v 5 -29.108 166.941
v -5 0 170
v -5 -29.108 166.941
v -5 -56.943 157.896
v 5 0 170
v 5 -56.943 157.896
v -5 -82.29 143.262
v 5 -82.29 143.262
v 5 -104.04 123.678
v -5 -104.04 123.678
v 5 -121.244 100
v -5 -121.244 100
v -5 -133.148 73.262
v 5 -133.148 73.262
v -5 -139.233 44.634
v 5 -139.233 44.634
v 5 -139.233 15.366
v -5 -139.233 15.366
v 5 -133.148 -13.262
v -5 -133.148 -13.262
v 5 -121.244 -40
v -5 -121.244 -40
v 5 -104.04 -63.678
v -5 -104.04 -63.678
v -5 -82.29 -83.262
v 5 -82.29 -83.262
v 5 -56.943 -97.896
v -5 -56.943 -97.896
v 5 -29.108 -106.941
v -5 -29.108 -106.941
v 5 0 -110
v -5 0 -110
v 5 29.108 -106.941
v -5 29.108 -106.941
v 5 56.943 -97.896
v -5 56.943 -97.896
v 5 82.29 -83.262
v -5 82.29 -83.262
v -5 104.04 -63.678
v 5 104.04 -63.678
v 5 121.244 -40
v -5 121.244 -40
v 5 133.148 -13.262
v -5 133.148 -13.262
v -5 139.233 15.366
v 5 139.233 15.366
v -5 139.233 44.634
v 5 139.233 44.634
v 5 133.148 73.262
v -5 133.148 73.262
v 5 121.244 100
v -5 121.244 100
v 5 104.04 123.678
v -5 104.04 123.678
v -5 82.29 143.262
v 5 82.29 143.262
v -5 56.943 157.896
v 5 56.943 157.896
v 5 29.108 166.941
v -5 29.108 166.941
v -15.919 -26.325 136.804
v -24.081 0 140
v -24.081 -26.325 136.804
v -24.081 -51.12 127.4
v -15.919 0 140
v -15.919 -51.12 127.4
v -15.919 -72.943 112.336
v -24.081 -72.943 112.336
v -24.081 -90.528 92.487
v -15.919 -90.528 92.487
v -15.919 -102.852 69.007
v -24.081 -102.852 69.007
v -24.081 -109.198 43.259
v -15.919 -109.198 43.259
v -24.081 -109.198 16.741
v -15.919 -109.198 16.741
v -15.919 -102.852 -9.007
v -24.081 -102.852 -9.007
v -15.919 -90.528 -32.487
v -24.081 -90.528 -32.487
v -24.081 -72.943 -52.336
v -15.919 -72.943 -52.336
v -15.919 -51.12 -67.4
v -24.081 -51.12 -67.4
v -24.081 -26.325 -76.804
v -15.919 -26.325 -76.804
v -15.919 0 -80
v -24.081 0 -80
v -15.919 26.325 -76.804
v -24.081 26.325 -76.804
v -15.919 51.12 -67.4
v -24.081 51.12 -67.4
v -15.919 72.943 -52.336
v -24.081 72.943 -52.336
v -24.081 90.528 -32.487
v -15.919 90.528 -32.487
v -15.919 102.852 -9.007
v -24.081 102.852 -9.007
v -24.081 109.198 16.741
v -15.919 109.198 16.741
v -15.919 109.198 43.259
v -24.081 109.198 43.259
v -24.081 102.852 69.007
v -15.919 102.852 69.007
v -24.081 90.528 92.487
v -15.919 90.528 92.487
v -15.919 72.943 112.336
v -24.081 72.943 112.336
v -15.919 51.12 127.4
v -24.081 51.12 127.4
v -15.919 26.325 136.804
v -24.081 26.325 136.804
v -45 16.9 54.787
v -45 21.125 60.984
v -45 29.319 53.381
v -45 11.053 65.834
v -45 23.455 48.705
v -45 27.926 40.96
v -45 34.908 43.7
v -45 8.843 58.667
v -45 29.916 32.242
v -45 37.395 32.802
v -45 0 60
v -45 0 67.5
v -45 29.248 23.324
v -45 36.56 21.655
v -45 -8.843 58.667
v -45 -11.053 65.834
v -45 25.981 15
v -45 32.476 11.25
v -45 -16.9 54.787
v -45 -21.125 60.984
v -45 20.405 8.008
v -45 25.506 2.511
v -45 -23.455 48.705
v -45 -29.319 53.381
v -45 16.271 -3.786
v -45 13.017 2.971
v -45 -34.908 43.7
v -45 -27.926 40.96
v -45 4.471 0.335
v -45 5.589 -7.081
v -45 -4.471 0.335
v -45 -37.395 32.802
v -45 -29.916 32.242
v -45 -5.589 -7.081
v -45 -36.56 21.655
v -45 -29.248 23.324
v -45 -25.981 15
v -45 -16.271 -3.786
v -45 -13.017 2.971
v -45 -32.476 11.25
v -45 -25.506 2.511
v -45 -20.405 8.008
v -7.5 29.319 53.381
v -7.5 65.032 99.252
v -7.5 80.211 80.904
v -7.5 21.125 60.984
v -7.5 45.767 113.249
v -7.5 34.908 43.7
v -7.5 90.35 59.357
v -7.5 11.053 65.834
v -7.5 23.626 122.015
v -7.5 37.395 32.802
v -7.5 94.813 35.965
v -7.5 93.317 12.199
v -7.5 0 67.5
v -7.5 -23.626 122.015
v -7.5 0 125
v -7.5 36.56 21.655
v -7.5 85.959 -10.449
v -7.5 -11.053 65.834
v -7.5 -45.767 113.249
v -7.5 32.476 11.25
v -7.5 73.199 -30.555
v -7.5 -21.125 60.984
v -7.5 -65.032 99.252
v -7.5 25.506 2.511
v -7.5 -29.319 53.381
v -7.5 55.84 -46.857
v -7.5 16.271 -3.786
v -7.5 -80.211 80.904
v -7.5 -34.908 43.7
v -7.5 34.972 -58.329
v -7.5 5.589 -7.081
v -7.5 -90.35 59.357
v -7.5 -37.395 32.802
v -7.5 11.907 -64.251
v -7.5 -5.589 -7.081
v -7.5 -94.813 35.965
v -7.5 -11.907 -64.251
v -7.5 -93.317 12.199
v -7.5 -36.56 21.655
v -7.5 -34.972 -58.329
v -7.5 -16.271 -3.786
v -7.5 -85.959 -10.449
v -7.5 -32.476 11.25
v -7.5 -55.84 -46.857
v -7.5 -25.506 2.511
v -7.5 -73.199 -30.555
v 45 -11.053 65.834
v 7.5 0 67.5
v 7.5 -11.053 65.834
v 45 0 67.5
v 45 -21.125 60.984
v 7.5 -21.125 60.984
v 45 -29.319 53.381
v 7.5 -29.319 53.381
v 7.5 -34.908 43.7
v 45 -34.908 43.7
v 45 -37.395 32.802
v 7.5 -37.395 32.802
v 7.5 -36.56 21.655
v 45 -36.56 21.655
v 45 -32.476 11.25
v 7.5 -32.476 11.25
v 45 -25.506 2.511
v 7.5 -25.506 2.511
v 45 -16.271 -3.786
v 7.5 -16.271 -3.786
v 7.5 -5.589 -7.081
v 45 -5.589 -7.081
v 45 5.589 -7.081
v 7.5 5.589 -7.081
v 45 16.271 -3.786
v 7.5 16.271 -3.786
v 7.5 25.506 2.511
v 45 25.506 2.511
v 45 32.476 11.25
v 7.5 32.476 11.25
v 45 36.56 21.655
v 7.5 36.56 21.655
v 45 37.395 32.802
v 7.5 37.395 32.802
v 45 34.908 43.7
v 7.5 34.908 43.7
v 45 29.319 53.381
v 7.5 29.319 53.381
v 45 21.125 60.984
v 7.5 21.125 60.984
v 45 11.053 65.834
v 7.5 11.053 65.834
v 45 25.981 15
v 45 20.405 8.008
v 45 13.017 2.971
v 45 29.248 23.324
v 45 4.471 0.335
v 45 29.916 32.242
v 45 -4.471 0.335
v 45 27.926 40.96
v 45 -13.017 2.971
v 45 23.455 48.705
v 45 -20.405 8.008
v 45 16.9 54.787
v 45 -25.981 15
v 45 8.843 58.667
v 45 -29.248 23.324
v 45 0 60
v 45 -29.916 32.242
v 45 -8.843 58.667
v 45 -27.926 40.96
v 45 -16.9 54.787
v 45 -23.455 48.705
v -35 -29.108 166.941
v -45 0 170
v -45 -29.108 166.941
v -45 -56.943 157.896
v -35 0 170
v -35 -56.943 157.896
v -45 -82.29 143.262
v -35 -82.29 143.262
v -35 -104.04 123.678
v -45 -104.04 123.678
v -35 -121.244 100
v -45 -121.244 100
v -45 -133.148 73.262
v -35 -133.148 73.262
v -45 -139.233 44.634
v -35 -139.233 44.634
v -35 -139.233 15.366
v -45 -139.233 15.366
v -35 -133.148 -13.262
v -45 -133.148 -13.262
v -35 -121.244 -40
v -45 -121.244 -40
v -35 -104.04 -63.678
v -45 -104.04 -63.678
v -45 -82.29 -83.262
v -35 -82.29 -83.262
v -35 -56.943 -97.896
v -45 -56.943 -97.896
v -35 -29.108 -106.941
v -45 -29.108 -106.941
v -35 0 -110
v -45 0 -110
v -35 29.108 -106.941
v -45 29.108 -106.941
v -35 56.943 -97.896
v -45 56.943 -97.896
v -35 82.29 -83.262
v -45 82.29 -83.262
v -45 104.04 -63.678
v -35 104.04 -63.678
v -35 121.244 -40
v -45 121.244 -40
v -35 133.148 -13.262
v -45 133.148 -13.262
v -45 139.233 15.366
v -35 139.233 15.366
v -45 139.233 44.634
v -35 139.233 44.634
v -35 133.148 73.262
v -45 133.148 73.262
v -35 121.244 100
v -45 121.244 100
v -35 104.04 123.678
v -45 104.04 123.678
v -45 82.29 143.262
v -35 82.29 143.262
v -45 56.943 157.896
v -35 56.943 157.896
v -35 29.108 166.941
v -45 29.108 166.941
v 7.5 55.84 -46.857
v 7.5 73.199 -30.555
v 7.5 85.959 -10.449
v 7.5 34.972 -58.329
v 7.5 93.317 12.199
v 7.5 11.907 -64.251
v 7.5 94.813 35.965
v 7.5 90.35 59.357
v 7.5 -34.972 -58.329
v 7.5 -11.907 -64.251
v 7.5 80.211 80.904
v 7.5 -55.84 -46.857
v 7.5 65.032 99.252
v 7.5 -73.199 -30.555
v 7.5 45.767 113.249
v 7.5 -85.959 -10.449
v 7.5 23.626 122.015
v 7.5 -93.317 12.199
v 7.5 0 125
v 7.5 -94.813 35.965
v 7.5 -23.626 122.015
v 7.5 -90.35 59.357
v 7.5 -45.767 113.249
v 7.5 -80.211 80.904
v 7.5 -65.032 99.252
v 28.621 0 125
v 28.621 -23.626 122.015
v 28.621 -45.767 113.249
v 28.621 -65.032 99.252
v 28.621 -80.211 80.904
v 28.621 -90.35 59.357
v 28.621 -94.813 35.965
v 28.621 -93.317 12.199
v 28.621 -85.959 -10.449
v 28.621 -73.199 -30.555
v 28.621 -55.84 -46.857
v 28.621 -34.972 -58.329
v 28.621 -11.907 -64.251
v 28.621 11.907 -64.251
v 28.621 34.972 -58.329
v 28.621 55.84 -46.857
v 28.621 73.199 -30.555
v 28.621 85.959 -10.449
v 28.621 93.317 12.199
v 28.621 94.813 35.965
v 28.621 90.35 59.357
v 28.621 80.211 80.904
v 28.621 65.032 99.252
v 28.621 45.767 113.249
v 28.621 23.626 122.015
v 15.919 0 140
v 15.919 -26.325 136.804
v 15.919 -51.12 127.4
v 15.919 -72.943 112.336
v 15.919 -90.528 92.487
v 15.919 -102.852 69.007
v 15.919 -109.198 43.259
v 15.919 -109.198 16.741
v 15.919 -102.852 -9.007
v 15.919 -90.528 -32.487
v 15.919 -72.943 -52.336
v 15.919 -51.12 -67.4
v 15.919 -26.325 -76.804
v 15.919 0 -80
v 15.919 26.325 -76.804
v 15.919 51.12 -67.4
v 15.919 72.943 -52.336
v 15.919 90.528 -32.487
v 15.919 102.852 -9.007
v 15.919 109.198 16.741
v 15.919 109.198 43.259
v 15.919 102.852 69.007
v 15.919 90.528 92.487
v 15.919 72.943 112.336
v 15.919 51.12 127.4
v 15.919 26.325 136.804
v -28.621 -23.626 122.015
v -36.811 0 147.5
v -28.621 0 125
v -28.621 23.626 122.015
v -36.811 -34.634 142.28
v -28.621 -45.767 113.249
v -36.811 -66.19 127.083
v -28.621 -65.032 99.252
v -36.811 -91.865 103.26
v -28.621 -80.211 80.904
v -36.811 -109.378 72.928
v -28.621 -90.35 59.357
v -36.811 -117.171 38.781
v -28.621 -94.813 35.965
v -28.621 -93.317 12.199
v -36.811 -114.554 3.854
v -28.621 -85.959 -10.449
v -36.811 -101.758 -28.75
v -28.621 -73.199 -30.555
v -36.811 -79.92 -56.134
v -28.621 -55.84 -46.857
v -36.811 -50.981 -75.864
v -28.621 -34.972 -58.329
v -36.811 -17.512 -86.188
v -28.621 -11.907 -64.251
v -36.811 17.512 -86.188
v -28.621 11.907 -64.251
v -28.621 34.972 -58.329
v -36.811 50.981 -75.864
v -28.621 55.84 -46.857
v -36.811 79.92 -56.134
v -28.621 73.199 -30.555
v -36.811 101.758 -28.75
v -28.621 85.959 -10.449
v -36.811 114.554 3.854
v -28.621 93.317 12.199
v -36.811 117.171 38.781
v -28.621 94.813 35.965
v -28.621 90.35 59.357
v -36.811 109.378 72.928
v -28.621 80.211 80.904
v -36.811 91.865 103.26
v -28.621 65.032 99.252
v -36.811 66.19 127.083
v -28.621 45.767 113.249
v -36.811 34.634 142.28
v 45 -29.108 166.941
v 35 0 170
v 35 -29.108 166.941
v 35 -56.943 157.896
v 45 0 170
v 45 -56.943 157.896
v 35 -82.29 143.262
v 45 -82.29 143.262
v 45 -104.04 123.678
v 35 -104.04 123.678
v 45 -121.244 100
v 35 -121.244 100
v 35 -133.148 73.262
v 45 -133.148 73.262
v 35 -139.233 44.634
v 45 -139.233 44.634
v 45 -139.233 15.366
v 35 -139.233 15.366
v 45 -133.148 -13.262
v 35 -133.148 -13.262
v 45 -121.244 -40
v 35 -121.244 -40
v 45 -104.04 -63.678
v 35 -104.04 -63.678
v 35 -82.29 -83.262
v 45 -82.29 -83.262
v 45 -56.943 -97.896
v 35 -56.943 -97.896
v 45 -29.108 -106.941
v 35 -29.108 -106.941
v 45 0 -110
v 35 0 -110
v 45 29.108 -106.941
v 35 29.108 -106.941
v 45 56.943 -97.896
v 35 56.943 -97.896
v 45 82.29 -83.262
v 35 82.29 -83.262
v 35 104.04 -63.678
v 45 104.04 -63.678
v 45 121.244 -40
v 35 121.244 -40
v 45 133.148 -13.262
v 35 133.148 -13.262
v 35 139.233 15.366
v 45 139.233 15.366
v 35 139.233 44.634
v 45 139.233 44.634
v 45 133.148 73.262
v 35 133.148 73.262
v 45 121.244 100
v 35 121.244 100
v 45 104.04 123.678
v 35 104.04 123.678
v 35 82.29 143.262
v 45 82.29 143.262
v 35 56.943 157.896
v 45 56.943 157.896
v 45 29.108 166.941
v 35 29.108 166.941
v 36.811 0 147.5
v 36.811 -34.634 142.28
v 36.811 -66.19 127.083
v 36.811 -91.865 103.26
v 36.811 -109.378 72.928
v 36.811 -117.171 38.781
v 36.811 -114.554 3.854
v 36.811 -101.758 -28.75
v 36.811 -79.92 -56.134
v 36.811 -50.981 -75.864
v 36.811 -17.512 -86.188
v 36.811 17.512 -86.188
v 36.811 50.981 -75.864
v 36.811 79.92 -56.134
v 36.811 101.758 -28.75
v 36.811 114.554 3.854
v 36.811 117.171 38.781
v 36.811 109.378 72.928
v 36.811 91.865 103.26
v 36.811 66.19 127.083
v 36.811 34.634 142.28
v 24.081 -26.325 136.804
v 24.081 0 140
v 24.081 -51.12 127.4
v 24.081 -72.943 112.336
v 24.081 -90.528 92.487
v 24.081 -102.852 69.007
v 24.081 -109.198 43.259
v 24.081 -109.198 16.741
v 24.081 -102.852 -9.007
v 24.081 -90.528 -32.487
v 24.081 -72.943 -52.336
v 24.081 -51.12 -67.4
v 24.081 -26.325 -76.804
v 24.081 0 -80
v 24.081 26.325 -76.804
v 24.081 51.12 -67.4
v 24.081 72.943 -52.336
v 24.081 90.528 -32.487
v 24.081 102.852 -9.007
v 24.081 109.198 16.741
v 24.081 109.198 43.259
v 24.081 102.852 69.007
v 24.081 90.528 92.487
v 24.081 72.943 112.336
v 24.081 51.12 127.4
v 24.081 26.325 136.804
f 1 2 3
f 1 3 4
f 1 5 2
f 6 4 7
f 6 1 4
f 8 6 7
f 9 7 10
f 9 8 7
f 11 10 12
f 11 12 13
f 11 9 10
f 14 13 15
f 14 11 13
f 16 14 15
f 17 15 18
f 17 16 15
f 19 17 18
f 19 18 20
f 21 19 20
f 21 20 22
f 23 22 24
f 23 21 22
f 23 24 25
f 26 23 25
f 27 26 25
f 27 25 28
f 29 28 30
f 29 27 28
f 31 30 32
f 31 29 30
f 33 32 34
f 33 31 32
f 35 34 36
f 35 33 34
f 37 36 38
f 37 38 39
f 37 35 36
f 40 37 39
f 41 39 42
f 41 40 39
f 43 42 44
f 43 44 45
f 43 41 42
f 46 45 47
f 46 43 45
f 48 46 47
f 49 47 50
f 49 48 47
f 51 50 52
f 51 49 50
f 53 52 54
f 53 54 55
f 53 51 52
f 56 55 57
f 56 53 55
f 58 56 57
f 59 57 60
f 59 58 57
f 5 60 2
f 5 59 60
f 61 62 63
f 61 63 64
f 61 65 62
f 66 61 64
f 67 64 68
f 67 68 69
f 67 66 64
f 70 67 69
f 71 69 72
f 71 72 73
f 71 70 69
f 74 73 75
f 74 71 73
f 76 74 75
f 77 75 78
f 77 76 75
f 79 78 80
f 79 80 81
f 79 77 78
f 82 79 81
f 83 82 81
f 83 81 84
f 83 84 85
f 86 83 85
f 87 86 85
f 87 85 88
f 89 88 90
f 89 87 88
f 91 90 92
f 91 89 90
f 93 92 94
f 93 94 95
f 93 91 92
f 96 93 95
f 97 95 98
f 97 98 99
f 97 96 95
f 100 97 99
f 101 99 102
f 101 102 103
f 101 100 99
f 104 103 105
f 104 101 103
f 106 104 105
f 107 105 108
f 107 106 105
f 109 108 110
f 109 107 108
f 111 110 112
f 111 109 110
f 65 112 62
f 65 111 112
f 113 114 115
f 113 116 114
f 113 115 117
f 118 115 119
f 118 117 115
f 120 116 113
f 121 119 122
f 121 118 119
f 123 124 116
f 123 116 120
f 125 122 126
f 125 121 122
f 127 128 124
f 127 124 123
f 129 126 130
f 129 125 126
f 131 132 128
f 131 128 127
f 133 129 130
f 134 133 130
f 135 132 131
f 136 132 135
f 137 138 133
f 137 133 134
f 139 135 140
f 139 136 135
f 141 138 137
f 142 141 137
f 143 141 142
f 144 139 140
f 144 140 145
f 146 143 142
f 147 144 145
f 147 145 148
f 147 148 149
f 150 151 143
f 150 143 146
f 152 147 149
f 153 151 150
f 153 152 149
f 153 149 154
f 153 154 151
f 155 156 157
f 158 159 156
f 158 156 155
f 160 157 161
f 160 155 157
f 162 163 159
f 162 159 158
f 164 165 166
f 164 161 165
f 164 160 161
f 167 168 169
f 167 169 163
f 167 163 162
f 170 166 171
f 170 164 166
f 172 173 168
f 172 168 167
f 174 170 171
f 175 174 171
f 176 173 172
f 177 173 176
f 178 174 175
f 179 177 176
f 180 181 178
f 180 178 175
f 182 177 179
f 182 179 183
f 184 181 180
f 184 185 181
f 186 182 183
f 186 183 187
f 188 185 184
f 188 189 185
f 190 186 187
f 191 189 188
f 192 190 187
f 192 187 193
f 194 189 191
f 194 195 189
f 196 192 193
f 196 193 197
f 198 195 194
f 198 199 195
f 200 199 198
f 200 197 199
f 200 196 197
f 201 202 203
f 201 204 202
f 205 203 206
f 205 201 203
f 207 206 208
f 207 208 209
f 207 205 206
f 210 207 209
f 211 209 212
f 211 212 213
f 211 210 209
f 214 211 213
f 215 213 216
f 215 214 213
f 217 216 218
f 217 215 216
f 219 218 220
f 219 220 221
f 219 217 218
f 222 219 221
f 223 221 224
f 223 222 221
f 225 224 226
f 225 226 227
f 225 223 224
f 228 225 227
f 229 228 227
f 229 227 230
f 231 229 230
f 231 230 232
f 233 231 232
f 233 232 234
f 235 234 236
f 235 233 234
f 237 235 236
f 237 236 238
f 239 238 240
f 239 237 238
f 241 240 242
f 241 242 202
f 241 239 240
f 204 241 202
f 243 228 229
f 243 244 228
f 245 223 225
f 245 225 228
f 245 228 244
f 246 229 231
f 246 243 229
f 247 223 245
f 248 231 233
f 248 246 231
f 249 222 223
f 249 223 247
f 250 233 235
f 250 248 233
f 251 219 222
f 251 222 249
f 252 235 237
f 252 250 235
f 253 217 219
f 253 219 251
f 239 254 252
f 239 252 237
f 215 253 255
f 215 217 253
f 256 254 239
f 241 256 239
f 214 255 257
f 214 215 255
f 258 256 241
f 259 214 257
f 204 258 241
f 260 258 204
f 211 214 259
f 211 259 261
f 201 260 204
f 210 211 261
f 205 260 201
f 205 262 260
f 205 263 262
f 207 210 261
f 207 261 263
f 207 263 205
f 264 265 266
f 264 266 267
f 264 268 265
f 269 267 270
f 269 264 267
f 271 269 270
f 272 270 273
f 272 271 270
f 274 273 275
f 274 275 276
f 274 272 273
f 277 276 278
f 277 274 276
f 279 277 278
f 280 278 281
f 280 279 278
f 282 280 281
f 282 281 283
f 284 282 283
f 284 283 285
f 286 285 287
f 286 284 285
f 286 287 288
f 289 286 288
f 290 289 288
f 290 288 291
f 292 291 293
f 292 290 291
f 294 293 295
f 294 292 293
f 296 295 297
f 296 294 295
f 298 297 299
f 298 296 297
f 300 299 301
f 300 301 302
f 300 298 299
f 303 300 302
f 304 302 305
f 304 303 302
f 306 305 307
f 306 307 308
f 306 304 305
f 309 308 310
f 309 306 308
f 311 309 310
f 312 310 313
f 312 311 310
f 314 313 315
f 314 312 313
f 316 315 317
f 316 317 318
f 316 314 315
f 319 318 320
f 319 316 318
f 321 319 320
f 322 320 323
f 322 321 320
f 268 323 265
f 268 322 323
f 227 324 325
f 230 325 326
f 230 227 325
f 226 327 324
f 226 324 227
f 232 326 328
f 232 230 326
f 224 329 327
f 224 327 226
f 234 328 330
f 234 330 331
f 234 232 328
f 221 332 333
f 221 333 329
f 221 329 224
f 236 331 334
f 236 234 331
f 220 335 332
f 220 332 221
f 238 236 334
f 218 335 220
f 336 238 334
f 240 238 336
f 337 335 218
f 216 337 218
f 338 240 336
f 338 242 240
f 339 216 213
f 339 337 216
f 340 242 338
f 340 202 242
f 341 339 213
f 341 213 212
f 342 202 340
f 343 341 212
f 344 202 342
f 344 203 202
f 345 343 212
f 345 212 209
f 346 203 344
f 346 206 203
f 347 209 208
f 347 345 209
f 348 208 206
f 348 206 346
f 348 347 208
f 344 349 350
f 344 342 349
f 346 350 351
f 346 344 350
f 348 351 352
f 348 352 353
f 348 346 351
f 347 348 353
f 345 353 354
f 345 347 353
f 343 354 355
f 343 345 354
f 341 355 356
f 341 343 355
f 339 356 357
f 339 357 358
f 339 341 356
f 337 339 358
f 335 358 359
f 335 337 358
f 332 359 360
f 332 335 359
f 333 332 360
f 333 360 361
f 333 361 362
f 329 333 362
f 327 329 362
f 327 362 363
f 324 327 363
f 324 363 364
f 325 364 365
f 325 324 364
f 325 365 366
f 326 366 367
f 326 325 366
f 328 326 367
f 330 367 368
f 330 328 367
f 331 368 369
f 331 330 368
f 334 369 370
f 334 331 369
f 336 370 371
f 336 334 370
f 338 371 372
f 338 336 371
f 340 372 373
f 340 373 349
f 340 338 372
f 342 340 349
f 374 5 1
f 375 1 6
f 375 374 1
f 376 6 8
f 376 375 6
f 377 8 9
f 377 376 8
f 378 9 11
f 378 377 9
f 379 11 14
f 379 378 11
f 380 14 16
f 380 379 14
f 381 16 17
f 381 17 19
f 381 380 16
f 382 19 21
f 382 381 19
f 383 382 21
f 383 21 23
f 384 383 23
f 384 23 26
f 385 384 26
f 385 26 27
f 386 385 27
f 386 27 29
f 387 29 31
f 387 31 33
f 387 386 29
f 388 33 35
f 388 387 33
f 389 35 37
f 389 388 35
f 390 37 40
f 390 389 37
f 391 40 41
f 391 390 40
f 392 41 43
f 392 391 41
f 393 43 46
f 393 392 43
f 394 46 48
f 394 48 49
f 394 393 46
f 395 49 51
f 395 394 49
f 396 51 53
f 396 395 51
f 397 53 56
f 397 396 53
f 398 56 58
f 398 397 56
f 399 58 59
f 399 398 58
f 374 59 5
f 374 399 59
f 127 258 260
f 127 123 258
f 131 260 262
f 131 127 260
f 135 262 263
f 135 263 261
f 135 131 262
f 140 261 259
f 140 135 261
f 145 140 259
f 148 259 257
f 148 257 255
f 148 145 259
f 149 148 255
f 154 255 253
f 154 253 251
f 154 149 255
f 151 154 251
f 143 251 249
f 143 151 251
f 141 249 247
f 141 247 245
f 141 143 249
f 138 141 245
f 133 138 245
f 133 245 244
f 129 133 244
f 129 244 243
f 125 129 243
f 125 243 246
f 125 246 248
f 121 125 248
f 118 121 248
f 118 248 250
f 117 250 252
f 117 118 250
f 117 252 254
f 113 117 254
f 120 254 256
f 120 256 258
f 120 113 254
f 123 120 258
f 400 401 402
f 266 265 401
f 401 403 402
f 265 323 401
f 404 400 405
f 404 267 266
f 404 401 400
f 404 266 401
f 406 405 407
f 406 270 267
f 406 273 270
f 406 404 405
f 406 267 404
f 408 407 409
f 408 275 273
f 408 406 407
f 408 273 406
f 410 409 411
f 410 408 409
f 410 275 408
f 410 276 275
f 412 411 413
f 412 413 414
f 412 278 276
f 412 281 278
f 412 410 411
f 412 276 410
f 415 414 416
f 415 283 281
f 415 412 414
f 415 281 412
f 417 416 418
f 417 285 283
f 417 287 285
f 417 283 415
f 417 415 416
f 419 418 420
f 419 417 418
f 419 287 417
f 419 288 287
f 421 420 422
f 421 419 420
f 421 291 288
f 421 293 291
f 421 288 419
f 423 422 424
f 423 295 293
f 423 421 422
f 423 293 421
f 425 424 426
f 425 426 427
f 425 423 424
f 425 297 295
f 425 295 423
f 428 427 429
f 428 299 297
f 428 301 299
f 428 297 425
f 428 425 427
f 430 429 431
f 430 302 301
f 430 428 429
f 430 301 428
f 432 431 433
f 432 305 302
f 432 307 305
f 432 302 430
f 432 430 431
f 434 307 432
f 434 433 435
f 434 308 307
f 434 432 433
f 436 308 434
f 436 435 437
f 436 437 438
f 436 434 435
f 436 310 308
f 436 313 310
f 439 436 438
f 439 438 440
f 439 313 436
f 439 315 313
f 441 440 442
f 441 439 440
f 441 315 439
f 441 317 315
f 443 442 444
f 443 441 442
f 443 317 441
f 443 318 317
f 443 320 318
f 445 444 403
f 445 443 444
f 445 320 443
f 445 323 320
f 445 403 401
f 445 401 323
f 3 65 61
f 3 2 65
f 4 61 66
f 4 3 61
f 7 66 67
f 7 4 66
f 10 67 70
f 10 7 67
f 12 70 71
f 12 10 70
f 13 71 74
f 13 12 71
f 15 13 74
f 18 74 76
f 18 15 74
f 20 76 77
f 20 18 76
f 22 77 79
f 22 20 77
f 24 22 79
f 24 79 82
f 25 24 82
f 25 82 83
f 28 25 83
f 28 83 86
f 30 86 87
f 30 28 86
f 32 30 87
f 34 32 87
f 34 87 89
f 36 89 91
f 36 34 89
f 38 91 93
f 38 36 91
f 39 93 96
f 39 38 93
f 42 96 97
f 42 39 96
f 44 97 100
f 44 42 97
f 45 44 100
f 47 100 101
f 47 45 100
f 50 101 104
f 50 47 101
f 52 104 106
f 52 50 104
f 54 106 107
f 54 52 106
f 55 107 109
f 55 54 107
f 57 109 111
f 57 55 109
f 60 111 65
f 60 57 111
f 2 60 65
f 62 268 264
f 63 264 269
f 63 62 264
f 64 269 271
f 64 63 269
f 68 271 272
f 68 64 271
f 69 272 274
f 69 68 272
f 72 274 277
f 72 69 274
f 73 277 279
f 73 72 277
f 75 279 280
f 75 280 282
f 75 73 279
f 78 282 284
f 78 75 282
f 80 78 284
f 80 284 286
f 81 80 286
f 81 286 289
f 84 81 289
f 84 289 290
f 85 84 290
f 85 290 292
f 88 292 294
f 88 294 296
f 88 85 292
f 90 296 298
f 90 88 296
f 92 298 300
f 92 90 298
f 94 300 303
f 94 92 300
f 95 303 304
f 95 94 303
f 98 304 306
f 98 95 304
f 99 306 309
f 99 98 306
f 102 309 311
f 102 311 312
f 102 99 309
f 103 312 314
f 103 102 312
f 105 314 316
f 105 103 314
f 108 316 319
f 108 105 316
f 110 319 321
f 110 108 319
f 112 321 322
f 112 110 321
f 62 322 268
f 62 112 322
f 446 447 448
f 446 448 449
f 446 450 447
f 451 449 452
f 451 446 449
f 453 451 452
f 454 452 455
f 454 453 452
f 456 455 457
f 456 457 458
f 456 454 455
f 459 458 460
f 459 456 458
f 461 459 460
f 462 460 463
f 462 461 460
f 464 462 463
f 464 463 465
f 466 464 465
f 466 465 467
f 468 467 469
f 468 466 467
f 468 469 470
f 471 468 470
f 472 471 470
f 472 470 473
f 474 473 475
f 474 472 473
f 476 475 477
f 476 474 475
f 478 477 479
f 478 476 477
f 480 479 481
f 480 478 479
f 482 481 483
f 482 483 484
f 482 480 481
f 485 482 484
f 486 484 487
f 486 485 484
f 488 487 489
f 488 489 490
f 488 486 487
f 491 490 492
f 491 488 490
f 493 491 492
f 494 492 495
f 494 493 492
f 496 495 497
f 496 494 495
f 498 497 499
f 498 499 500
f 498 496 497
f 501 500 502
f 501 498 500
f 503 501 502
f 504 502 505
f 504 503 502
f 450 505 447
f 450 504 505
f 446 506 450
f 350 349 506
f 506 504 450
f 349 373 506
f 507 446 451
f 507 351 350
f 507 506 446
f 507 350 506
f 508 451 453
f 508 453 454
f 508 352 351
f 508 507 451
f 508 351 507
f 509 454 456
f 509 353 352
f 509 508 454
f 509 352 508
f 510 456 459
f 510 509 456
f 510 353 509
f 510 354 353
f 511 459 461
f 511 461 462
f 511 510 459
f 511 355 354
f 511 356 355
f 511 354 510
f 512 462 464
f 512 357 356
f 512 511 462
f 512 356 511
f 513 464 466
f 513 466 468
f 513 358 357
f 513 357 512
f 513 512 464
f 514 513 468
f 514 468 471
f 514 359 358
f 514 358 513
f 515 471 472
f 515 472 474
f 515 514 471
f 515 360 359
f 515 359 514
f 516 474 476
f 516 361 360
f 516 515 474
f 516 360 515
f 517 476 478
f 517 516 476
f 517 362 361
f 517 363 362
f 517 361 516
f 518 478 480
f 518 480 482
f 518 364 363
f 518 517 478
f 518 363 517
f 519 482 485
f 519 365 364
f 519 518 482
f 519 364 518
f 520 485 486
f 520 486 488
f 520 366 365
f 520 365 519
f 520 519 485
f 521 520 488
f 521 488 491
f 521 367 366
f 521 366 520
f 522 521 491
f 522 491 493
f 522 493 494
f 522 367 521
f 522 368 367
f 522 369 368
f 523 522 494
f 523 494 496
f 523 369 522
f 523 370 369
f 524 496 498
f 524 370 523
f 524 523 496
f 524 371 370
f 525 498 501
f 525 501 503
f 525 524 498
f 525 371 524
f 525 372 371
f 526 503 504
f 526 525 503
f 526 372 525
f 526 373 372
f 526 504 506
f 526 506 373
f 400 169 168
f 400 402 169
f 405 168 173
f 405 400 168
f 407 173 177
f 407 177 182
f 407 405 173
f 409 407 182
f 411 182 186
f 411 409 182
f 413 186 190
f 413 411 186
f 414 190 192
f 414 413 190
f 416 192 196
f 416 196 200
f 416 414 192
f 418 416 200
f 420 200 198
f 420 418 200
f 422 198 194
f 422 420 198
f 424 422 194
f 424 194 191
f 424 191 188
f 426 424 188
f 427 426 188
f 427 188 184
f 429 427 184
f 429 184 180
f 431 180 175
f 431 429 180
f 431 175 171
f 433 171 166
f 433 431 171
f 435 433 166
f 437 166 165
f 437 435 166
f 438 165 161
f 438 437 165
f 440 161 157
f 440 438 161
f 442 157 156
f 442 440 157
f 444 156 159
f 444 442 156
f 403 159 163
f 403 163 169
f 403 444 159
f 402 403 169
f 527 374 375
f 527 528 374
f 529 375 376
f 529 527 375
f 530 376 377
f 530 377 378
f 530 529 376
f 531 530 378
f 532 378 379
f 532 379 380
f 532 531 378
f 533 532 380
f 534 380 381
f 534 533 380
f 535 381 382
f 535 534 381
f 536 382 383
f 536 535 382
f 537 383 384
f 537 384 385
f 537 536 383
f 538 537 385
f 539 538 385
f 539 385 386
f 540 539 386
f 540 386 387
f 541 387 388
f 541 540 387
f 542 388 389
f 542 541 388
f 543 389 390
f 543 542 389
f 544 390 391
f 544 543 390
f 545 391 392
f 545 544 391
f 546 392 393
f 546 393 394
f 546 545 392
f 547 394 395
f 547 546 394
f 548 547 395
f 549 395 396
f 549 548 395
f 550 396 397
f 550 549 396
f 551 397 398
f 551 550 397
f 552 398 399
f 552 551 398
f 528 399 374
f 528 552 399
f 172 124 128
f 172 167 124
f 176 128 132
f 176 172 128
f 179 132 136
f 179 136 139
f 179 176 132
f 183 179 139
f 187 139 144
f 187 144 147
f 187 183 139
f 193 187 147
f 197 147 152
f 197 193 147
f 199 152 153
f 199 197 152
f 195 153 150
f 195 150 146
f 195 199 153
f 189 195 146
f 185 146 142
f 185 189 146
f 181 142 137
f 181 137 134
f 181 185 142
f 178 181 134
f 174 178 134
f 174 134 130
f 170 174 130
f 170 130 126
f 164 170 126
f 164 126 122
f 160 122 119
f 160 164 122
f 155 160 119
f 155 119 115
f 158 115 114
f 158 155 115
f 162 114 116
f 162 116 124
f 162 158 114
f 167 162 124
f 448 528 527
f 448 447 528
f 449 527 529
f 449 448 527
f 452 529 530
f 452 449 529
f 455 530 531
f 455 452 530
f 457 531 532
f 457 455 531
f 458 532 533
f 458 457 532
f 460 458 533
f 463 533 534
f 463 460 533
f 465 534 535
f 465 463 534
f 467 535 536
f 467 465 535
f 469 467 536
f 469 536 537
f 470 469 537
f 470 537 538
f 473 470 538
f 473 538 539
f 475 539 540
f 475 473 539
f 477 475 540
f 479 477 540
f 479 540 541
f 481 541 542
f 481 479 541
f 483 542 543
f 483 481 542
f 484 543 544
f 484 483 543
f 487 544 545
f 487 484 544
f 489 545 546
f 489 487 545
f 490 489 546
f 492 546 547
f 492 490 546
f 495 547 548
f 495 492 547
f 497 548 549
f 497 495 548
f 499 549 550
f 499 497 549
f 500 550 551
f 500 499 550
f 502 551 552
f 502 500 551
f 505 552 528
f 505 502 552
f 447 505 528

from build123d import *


with BuildPart() as part:
    # Croquis1 → Revolución1 (revolve)
    with BuildSketch(Plane(origin=(0, 0, 0), x_dir=(1, 0, 0), z_dir=(0, 1, 0)), mode=Mode.PRIVATE) as revoluci_n1_sk:
        Polygon((-5, 110), (5, 110), (15.919107028, 80), (24.080892972, 80), (35, 110), (45, 110), (28.621339458, 65), (7.5, 65), (7.5, 7.5), (45, 7.5), (45, 0), (-45, 0), (-45, 7.5), (-7.5, 7.5), (-7.5, 65), (-28.621339458, 65), (-45, 110), (-35, 110), (-24.080892972, 80), (-15.919107028, 80), align=None)
    revolve(revoluci_n1_sk.sketch.rotate(Axis((-45, 0, 30), (1, 0, 0)), 180), axis=Axis((-45, 0, 30), (1, 0, 0)))


solid = part.part
